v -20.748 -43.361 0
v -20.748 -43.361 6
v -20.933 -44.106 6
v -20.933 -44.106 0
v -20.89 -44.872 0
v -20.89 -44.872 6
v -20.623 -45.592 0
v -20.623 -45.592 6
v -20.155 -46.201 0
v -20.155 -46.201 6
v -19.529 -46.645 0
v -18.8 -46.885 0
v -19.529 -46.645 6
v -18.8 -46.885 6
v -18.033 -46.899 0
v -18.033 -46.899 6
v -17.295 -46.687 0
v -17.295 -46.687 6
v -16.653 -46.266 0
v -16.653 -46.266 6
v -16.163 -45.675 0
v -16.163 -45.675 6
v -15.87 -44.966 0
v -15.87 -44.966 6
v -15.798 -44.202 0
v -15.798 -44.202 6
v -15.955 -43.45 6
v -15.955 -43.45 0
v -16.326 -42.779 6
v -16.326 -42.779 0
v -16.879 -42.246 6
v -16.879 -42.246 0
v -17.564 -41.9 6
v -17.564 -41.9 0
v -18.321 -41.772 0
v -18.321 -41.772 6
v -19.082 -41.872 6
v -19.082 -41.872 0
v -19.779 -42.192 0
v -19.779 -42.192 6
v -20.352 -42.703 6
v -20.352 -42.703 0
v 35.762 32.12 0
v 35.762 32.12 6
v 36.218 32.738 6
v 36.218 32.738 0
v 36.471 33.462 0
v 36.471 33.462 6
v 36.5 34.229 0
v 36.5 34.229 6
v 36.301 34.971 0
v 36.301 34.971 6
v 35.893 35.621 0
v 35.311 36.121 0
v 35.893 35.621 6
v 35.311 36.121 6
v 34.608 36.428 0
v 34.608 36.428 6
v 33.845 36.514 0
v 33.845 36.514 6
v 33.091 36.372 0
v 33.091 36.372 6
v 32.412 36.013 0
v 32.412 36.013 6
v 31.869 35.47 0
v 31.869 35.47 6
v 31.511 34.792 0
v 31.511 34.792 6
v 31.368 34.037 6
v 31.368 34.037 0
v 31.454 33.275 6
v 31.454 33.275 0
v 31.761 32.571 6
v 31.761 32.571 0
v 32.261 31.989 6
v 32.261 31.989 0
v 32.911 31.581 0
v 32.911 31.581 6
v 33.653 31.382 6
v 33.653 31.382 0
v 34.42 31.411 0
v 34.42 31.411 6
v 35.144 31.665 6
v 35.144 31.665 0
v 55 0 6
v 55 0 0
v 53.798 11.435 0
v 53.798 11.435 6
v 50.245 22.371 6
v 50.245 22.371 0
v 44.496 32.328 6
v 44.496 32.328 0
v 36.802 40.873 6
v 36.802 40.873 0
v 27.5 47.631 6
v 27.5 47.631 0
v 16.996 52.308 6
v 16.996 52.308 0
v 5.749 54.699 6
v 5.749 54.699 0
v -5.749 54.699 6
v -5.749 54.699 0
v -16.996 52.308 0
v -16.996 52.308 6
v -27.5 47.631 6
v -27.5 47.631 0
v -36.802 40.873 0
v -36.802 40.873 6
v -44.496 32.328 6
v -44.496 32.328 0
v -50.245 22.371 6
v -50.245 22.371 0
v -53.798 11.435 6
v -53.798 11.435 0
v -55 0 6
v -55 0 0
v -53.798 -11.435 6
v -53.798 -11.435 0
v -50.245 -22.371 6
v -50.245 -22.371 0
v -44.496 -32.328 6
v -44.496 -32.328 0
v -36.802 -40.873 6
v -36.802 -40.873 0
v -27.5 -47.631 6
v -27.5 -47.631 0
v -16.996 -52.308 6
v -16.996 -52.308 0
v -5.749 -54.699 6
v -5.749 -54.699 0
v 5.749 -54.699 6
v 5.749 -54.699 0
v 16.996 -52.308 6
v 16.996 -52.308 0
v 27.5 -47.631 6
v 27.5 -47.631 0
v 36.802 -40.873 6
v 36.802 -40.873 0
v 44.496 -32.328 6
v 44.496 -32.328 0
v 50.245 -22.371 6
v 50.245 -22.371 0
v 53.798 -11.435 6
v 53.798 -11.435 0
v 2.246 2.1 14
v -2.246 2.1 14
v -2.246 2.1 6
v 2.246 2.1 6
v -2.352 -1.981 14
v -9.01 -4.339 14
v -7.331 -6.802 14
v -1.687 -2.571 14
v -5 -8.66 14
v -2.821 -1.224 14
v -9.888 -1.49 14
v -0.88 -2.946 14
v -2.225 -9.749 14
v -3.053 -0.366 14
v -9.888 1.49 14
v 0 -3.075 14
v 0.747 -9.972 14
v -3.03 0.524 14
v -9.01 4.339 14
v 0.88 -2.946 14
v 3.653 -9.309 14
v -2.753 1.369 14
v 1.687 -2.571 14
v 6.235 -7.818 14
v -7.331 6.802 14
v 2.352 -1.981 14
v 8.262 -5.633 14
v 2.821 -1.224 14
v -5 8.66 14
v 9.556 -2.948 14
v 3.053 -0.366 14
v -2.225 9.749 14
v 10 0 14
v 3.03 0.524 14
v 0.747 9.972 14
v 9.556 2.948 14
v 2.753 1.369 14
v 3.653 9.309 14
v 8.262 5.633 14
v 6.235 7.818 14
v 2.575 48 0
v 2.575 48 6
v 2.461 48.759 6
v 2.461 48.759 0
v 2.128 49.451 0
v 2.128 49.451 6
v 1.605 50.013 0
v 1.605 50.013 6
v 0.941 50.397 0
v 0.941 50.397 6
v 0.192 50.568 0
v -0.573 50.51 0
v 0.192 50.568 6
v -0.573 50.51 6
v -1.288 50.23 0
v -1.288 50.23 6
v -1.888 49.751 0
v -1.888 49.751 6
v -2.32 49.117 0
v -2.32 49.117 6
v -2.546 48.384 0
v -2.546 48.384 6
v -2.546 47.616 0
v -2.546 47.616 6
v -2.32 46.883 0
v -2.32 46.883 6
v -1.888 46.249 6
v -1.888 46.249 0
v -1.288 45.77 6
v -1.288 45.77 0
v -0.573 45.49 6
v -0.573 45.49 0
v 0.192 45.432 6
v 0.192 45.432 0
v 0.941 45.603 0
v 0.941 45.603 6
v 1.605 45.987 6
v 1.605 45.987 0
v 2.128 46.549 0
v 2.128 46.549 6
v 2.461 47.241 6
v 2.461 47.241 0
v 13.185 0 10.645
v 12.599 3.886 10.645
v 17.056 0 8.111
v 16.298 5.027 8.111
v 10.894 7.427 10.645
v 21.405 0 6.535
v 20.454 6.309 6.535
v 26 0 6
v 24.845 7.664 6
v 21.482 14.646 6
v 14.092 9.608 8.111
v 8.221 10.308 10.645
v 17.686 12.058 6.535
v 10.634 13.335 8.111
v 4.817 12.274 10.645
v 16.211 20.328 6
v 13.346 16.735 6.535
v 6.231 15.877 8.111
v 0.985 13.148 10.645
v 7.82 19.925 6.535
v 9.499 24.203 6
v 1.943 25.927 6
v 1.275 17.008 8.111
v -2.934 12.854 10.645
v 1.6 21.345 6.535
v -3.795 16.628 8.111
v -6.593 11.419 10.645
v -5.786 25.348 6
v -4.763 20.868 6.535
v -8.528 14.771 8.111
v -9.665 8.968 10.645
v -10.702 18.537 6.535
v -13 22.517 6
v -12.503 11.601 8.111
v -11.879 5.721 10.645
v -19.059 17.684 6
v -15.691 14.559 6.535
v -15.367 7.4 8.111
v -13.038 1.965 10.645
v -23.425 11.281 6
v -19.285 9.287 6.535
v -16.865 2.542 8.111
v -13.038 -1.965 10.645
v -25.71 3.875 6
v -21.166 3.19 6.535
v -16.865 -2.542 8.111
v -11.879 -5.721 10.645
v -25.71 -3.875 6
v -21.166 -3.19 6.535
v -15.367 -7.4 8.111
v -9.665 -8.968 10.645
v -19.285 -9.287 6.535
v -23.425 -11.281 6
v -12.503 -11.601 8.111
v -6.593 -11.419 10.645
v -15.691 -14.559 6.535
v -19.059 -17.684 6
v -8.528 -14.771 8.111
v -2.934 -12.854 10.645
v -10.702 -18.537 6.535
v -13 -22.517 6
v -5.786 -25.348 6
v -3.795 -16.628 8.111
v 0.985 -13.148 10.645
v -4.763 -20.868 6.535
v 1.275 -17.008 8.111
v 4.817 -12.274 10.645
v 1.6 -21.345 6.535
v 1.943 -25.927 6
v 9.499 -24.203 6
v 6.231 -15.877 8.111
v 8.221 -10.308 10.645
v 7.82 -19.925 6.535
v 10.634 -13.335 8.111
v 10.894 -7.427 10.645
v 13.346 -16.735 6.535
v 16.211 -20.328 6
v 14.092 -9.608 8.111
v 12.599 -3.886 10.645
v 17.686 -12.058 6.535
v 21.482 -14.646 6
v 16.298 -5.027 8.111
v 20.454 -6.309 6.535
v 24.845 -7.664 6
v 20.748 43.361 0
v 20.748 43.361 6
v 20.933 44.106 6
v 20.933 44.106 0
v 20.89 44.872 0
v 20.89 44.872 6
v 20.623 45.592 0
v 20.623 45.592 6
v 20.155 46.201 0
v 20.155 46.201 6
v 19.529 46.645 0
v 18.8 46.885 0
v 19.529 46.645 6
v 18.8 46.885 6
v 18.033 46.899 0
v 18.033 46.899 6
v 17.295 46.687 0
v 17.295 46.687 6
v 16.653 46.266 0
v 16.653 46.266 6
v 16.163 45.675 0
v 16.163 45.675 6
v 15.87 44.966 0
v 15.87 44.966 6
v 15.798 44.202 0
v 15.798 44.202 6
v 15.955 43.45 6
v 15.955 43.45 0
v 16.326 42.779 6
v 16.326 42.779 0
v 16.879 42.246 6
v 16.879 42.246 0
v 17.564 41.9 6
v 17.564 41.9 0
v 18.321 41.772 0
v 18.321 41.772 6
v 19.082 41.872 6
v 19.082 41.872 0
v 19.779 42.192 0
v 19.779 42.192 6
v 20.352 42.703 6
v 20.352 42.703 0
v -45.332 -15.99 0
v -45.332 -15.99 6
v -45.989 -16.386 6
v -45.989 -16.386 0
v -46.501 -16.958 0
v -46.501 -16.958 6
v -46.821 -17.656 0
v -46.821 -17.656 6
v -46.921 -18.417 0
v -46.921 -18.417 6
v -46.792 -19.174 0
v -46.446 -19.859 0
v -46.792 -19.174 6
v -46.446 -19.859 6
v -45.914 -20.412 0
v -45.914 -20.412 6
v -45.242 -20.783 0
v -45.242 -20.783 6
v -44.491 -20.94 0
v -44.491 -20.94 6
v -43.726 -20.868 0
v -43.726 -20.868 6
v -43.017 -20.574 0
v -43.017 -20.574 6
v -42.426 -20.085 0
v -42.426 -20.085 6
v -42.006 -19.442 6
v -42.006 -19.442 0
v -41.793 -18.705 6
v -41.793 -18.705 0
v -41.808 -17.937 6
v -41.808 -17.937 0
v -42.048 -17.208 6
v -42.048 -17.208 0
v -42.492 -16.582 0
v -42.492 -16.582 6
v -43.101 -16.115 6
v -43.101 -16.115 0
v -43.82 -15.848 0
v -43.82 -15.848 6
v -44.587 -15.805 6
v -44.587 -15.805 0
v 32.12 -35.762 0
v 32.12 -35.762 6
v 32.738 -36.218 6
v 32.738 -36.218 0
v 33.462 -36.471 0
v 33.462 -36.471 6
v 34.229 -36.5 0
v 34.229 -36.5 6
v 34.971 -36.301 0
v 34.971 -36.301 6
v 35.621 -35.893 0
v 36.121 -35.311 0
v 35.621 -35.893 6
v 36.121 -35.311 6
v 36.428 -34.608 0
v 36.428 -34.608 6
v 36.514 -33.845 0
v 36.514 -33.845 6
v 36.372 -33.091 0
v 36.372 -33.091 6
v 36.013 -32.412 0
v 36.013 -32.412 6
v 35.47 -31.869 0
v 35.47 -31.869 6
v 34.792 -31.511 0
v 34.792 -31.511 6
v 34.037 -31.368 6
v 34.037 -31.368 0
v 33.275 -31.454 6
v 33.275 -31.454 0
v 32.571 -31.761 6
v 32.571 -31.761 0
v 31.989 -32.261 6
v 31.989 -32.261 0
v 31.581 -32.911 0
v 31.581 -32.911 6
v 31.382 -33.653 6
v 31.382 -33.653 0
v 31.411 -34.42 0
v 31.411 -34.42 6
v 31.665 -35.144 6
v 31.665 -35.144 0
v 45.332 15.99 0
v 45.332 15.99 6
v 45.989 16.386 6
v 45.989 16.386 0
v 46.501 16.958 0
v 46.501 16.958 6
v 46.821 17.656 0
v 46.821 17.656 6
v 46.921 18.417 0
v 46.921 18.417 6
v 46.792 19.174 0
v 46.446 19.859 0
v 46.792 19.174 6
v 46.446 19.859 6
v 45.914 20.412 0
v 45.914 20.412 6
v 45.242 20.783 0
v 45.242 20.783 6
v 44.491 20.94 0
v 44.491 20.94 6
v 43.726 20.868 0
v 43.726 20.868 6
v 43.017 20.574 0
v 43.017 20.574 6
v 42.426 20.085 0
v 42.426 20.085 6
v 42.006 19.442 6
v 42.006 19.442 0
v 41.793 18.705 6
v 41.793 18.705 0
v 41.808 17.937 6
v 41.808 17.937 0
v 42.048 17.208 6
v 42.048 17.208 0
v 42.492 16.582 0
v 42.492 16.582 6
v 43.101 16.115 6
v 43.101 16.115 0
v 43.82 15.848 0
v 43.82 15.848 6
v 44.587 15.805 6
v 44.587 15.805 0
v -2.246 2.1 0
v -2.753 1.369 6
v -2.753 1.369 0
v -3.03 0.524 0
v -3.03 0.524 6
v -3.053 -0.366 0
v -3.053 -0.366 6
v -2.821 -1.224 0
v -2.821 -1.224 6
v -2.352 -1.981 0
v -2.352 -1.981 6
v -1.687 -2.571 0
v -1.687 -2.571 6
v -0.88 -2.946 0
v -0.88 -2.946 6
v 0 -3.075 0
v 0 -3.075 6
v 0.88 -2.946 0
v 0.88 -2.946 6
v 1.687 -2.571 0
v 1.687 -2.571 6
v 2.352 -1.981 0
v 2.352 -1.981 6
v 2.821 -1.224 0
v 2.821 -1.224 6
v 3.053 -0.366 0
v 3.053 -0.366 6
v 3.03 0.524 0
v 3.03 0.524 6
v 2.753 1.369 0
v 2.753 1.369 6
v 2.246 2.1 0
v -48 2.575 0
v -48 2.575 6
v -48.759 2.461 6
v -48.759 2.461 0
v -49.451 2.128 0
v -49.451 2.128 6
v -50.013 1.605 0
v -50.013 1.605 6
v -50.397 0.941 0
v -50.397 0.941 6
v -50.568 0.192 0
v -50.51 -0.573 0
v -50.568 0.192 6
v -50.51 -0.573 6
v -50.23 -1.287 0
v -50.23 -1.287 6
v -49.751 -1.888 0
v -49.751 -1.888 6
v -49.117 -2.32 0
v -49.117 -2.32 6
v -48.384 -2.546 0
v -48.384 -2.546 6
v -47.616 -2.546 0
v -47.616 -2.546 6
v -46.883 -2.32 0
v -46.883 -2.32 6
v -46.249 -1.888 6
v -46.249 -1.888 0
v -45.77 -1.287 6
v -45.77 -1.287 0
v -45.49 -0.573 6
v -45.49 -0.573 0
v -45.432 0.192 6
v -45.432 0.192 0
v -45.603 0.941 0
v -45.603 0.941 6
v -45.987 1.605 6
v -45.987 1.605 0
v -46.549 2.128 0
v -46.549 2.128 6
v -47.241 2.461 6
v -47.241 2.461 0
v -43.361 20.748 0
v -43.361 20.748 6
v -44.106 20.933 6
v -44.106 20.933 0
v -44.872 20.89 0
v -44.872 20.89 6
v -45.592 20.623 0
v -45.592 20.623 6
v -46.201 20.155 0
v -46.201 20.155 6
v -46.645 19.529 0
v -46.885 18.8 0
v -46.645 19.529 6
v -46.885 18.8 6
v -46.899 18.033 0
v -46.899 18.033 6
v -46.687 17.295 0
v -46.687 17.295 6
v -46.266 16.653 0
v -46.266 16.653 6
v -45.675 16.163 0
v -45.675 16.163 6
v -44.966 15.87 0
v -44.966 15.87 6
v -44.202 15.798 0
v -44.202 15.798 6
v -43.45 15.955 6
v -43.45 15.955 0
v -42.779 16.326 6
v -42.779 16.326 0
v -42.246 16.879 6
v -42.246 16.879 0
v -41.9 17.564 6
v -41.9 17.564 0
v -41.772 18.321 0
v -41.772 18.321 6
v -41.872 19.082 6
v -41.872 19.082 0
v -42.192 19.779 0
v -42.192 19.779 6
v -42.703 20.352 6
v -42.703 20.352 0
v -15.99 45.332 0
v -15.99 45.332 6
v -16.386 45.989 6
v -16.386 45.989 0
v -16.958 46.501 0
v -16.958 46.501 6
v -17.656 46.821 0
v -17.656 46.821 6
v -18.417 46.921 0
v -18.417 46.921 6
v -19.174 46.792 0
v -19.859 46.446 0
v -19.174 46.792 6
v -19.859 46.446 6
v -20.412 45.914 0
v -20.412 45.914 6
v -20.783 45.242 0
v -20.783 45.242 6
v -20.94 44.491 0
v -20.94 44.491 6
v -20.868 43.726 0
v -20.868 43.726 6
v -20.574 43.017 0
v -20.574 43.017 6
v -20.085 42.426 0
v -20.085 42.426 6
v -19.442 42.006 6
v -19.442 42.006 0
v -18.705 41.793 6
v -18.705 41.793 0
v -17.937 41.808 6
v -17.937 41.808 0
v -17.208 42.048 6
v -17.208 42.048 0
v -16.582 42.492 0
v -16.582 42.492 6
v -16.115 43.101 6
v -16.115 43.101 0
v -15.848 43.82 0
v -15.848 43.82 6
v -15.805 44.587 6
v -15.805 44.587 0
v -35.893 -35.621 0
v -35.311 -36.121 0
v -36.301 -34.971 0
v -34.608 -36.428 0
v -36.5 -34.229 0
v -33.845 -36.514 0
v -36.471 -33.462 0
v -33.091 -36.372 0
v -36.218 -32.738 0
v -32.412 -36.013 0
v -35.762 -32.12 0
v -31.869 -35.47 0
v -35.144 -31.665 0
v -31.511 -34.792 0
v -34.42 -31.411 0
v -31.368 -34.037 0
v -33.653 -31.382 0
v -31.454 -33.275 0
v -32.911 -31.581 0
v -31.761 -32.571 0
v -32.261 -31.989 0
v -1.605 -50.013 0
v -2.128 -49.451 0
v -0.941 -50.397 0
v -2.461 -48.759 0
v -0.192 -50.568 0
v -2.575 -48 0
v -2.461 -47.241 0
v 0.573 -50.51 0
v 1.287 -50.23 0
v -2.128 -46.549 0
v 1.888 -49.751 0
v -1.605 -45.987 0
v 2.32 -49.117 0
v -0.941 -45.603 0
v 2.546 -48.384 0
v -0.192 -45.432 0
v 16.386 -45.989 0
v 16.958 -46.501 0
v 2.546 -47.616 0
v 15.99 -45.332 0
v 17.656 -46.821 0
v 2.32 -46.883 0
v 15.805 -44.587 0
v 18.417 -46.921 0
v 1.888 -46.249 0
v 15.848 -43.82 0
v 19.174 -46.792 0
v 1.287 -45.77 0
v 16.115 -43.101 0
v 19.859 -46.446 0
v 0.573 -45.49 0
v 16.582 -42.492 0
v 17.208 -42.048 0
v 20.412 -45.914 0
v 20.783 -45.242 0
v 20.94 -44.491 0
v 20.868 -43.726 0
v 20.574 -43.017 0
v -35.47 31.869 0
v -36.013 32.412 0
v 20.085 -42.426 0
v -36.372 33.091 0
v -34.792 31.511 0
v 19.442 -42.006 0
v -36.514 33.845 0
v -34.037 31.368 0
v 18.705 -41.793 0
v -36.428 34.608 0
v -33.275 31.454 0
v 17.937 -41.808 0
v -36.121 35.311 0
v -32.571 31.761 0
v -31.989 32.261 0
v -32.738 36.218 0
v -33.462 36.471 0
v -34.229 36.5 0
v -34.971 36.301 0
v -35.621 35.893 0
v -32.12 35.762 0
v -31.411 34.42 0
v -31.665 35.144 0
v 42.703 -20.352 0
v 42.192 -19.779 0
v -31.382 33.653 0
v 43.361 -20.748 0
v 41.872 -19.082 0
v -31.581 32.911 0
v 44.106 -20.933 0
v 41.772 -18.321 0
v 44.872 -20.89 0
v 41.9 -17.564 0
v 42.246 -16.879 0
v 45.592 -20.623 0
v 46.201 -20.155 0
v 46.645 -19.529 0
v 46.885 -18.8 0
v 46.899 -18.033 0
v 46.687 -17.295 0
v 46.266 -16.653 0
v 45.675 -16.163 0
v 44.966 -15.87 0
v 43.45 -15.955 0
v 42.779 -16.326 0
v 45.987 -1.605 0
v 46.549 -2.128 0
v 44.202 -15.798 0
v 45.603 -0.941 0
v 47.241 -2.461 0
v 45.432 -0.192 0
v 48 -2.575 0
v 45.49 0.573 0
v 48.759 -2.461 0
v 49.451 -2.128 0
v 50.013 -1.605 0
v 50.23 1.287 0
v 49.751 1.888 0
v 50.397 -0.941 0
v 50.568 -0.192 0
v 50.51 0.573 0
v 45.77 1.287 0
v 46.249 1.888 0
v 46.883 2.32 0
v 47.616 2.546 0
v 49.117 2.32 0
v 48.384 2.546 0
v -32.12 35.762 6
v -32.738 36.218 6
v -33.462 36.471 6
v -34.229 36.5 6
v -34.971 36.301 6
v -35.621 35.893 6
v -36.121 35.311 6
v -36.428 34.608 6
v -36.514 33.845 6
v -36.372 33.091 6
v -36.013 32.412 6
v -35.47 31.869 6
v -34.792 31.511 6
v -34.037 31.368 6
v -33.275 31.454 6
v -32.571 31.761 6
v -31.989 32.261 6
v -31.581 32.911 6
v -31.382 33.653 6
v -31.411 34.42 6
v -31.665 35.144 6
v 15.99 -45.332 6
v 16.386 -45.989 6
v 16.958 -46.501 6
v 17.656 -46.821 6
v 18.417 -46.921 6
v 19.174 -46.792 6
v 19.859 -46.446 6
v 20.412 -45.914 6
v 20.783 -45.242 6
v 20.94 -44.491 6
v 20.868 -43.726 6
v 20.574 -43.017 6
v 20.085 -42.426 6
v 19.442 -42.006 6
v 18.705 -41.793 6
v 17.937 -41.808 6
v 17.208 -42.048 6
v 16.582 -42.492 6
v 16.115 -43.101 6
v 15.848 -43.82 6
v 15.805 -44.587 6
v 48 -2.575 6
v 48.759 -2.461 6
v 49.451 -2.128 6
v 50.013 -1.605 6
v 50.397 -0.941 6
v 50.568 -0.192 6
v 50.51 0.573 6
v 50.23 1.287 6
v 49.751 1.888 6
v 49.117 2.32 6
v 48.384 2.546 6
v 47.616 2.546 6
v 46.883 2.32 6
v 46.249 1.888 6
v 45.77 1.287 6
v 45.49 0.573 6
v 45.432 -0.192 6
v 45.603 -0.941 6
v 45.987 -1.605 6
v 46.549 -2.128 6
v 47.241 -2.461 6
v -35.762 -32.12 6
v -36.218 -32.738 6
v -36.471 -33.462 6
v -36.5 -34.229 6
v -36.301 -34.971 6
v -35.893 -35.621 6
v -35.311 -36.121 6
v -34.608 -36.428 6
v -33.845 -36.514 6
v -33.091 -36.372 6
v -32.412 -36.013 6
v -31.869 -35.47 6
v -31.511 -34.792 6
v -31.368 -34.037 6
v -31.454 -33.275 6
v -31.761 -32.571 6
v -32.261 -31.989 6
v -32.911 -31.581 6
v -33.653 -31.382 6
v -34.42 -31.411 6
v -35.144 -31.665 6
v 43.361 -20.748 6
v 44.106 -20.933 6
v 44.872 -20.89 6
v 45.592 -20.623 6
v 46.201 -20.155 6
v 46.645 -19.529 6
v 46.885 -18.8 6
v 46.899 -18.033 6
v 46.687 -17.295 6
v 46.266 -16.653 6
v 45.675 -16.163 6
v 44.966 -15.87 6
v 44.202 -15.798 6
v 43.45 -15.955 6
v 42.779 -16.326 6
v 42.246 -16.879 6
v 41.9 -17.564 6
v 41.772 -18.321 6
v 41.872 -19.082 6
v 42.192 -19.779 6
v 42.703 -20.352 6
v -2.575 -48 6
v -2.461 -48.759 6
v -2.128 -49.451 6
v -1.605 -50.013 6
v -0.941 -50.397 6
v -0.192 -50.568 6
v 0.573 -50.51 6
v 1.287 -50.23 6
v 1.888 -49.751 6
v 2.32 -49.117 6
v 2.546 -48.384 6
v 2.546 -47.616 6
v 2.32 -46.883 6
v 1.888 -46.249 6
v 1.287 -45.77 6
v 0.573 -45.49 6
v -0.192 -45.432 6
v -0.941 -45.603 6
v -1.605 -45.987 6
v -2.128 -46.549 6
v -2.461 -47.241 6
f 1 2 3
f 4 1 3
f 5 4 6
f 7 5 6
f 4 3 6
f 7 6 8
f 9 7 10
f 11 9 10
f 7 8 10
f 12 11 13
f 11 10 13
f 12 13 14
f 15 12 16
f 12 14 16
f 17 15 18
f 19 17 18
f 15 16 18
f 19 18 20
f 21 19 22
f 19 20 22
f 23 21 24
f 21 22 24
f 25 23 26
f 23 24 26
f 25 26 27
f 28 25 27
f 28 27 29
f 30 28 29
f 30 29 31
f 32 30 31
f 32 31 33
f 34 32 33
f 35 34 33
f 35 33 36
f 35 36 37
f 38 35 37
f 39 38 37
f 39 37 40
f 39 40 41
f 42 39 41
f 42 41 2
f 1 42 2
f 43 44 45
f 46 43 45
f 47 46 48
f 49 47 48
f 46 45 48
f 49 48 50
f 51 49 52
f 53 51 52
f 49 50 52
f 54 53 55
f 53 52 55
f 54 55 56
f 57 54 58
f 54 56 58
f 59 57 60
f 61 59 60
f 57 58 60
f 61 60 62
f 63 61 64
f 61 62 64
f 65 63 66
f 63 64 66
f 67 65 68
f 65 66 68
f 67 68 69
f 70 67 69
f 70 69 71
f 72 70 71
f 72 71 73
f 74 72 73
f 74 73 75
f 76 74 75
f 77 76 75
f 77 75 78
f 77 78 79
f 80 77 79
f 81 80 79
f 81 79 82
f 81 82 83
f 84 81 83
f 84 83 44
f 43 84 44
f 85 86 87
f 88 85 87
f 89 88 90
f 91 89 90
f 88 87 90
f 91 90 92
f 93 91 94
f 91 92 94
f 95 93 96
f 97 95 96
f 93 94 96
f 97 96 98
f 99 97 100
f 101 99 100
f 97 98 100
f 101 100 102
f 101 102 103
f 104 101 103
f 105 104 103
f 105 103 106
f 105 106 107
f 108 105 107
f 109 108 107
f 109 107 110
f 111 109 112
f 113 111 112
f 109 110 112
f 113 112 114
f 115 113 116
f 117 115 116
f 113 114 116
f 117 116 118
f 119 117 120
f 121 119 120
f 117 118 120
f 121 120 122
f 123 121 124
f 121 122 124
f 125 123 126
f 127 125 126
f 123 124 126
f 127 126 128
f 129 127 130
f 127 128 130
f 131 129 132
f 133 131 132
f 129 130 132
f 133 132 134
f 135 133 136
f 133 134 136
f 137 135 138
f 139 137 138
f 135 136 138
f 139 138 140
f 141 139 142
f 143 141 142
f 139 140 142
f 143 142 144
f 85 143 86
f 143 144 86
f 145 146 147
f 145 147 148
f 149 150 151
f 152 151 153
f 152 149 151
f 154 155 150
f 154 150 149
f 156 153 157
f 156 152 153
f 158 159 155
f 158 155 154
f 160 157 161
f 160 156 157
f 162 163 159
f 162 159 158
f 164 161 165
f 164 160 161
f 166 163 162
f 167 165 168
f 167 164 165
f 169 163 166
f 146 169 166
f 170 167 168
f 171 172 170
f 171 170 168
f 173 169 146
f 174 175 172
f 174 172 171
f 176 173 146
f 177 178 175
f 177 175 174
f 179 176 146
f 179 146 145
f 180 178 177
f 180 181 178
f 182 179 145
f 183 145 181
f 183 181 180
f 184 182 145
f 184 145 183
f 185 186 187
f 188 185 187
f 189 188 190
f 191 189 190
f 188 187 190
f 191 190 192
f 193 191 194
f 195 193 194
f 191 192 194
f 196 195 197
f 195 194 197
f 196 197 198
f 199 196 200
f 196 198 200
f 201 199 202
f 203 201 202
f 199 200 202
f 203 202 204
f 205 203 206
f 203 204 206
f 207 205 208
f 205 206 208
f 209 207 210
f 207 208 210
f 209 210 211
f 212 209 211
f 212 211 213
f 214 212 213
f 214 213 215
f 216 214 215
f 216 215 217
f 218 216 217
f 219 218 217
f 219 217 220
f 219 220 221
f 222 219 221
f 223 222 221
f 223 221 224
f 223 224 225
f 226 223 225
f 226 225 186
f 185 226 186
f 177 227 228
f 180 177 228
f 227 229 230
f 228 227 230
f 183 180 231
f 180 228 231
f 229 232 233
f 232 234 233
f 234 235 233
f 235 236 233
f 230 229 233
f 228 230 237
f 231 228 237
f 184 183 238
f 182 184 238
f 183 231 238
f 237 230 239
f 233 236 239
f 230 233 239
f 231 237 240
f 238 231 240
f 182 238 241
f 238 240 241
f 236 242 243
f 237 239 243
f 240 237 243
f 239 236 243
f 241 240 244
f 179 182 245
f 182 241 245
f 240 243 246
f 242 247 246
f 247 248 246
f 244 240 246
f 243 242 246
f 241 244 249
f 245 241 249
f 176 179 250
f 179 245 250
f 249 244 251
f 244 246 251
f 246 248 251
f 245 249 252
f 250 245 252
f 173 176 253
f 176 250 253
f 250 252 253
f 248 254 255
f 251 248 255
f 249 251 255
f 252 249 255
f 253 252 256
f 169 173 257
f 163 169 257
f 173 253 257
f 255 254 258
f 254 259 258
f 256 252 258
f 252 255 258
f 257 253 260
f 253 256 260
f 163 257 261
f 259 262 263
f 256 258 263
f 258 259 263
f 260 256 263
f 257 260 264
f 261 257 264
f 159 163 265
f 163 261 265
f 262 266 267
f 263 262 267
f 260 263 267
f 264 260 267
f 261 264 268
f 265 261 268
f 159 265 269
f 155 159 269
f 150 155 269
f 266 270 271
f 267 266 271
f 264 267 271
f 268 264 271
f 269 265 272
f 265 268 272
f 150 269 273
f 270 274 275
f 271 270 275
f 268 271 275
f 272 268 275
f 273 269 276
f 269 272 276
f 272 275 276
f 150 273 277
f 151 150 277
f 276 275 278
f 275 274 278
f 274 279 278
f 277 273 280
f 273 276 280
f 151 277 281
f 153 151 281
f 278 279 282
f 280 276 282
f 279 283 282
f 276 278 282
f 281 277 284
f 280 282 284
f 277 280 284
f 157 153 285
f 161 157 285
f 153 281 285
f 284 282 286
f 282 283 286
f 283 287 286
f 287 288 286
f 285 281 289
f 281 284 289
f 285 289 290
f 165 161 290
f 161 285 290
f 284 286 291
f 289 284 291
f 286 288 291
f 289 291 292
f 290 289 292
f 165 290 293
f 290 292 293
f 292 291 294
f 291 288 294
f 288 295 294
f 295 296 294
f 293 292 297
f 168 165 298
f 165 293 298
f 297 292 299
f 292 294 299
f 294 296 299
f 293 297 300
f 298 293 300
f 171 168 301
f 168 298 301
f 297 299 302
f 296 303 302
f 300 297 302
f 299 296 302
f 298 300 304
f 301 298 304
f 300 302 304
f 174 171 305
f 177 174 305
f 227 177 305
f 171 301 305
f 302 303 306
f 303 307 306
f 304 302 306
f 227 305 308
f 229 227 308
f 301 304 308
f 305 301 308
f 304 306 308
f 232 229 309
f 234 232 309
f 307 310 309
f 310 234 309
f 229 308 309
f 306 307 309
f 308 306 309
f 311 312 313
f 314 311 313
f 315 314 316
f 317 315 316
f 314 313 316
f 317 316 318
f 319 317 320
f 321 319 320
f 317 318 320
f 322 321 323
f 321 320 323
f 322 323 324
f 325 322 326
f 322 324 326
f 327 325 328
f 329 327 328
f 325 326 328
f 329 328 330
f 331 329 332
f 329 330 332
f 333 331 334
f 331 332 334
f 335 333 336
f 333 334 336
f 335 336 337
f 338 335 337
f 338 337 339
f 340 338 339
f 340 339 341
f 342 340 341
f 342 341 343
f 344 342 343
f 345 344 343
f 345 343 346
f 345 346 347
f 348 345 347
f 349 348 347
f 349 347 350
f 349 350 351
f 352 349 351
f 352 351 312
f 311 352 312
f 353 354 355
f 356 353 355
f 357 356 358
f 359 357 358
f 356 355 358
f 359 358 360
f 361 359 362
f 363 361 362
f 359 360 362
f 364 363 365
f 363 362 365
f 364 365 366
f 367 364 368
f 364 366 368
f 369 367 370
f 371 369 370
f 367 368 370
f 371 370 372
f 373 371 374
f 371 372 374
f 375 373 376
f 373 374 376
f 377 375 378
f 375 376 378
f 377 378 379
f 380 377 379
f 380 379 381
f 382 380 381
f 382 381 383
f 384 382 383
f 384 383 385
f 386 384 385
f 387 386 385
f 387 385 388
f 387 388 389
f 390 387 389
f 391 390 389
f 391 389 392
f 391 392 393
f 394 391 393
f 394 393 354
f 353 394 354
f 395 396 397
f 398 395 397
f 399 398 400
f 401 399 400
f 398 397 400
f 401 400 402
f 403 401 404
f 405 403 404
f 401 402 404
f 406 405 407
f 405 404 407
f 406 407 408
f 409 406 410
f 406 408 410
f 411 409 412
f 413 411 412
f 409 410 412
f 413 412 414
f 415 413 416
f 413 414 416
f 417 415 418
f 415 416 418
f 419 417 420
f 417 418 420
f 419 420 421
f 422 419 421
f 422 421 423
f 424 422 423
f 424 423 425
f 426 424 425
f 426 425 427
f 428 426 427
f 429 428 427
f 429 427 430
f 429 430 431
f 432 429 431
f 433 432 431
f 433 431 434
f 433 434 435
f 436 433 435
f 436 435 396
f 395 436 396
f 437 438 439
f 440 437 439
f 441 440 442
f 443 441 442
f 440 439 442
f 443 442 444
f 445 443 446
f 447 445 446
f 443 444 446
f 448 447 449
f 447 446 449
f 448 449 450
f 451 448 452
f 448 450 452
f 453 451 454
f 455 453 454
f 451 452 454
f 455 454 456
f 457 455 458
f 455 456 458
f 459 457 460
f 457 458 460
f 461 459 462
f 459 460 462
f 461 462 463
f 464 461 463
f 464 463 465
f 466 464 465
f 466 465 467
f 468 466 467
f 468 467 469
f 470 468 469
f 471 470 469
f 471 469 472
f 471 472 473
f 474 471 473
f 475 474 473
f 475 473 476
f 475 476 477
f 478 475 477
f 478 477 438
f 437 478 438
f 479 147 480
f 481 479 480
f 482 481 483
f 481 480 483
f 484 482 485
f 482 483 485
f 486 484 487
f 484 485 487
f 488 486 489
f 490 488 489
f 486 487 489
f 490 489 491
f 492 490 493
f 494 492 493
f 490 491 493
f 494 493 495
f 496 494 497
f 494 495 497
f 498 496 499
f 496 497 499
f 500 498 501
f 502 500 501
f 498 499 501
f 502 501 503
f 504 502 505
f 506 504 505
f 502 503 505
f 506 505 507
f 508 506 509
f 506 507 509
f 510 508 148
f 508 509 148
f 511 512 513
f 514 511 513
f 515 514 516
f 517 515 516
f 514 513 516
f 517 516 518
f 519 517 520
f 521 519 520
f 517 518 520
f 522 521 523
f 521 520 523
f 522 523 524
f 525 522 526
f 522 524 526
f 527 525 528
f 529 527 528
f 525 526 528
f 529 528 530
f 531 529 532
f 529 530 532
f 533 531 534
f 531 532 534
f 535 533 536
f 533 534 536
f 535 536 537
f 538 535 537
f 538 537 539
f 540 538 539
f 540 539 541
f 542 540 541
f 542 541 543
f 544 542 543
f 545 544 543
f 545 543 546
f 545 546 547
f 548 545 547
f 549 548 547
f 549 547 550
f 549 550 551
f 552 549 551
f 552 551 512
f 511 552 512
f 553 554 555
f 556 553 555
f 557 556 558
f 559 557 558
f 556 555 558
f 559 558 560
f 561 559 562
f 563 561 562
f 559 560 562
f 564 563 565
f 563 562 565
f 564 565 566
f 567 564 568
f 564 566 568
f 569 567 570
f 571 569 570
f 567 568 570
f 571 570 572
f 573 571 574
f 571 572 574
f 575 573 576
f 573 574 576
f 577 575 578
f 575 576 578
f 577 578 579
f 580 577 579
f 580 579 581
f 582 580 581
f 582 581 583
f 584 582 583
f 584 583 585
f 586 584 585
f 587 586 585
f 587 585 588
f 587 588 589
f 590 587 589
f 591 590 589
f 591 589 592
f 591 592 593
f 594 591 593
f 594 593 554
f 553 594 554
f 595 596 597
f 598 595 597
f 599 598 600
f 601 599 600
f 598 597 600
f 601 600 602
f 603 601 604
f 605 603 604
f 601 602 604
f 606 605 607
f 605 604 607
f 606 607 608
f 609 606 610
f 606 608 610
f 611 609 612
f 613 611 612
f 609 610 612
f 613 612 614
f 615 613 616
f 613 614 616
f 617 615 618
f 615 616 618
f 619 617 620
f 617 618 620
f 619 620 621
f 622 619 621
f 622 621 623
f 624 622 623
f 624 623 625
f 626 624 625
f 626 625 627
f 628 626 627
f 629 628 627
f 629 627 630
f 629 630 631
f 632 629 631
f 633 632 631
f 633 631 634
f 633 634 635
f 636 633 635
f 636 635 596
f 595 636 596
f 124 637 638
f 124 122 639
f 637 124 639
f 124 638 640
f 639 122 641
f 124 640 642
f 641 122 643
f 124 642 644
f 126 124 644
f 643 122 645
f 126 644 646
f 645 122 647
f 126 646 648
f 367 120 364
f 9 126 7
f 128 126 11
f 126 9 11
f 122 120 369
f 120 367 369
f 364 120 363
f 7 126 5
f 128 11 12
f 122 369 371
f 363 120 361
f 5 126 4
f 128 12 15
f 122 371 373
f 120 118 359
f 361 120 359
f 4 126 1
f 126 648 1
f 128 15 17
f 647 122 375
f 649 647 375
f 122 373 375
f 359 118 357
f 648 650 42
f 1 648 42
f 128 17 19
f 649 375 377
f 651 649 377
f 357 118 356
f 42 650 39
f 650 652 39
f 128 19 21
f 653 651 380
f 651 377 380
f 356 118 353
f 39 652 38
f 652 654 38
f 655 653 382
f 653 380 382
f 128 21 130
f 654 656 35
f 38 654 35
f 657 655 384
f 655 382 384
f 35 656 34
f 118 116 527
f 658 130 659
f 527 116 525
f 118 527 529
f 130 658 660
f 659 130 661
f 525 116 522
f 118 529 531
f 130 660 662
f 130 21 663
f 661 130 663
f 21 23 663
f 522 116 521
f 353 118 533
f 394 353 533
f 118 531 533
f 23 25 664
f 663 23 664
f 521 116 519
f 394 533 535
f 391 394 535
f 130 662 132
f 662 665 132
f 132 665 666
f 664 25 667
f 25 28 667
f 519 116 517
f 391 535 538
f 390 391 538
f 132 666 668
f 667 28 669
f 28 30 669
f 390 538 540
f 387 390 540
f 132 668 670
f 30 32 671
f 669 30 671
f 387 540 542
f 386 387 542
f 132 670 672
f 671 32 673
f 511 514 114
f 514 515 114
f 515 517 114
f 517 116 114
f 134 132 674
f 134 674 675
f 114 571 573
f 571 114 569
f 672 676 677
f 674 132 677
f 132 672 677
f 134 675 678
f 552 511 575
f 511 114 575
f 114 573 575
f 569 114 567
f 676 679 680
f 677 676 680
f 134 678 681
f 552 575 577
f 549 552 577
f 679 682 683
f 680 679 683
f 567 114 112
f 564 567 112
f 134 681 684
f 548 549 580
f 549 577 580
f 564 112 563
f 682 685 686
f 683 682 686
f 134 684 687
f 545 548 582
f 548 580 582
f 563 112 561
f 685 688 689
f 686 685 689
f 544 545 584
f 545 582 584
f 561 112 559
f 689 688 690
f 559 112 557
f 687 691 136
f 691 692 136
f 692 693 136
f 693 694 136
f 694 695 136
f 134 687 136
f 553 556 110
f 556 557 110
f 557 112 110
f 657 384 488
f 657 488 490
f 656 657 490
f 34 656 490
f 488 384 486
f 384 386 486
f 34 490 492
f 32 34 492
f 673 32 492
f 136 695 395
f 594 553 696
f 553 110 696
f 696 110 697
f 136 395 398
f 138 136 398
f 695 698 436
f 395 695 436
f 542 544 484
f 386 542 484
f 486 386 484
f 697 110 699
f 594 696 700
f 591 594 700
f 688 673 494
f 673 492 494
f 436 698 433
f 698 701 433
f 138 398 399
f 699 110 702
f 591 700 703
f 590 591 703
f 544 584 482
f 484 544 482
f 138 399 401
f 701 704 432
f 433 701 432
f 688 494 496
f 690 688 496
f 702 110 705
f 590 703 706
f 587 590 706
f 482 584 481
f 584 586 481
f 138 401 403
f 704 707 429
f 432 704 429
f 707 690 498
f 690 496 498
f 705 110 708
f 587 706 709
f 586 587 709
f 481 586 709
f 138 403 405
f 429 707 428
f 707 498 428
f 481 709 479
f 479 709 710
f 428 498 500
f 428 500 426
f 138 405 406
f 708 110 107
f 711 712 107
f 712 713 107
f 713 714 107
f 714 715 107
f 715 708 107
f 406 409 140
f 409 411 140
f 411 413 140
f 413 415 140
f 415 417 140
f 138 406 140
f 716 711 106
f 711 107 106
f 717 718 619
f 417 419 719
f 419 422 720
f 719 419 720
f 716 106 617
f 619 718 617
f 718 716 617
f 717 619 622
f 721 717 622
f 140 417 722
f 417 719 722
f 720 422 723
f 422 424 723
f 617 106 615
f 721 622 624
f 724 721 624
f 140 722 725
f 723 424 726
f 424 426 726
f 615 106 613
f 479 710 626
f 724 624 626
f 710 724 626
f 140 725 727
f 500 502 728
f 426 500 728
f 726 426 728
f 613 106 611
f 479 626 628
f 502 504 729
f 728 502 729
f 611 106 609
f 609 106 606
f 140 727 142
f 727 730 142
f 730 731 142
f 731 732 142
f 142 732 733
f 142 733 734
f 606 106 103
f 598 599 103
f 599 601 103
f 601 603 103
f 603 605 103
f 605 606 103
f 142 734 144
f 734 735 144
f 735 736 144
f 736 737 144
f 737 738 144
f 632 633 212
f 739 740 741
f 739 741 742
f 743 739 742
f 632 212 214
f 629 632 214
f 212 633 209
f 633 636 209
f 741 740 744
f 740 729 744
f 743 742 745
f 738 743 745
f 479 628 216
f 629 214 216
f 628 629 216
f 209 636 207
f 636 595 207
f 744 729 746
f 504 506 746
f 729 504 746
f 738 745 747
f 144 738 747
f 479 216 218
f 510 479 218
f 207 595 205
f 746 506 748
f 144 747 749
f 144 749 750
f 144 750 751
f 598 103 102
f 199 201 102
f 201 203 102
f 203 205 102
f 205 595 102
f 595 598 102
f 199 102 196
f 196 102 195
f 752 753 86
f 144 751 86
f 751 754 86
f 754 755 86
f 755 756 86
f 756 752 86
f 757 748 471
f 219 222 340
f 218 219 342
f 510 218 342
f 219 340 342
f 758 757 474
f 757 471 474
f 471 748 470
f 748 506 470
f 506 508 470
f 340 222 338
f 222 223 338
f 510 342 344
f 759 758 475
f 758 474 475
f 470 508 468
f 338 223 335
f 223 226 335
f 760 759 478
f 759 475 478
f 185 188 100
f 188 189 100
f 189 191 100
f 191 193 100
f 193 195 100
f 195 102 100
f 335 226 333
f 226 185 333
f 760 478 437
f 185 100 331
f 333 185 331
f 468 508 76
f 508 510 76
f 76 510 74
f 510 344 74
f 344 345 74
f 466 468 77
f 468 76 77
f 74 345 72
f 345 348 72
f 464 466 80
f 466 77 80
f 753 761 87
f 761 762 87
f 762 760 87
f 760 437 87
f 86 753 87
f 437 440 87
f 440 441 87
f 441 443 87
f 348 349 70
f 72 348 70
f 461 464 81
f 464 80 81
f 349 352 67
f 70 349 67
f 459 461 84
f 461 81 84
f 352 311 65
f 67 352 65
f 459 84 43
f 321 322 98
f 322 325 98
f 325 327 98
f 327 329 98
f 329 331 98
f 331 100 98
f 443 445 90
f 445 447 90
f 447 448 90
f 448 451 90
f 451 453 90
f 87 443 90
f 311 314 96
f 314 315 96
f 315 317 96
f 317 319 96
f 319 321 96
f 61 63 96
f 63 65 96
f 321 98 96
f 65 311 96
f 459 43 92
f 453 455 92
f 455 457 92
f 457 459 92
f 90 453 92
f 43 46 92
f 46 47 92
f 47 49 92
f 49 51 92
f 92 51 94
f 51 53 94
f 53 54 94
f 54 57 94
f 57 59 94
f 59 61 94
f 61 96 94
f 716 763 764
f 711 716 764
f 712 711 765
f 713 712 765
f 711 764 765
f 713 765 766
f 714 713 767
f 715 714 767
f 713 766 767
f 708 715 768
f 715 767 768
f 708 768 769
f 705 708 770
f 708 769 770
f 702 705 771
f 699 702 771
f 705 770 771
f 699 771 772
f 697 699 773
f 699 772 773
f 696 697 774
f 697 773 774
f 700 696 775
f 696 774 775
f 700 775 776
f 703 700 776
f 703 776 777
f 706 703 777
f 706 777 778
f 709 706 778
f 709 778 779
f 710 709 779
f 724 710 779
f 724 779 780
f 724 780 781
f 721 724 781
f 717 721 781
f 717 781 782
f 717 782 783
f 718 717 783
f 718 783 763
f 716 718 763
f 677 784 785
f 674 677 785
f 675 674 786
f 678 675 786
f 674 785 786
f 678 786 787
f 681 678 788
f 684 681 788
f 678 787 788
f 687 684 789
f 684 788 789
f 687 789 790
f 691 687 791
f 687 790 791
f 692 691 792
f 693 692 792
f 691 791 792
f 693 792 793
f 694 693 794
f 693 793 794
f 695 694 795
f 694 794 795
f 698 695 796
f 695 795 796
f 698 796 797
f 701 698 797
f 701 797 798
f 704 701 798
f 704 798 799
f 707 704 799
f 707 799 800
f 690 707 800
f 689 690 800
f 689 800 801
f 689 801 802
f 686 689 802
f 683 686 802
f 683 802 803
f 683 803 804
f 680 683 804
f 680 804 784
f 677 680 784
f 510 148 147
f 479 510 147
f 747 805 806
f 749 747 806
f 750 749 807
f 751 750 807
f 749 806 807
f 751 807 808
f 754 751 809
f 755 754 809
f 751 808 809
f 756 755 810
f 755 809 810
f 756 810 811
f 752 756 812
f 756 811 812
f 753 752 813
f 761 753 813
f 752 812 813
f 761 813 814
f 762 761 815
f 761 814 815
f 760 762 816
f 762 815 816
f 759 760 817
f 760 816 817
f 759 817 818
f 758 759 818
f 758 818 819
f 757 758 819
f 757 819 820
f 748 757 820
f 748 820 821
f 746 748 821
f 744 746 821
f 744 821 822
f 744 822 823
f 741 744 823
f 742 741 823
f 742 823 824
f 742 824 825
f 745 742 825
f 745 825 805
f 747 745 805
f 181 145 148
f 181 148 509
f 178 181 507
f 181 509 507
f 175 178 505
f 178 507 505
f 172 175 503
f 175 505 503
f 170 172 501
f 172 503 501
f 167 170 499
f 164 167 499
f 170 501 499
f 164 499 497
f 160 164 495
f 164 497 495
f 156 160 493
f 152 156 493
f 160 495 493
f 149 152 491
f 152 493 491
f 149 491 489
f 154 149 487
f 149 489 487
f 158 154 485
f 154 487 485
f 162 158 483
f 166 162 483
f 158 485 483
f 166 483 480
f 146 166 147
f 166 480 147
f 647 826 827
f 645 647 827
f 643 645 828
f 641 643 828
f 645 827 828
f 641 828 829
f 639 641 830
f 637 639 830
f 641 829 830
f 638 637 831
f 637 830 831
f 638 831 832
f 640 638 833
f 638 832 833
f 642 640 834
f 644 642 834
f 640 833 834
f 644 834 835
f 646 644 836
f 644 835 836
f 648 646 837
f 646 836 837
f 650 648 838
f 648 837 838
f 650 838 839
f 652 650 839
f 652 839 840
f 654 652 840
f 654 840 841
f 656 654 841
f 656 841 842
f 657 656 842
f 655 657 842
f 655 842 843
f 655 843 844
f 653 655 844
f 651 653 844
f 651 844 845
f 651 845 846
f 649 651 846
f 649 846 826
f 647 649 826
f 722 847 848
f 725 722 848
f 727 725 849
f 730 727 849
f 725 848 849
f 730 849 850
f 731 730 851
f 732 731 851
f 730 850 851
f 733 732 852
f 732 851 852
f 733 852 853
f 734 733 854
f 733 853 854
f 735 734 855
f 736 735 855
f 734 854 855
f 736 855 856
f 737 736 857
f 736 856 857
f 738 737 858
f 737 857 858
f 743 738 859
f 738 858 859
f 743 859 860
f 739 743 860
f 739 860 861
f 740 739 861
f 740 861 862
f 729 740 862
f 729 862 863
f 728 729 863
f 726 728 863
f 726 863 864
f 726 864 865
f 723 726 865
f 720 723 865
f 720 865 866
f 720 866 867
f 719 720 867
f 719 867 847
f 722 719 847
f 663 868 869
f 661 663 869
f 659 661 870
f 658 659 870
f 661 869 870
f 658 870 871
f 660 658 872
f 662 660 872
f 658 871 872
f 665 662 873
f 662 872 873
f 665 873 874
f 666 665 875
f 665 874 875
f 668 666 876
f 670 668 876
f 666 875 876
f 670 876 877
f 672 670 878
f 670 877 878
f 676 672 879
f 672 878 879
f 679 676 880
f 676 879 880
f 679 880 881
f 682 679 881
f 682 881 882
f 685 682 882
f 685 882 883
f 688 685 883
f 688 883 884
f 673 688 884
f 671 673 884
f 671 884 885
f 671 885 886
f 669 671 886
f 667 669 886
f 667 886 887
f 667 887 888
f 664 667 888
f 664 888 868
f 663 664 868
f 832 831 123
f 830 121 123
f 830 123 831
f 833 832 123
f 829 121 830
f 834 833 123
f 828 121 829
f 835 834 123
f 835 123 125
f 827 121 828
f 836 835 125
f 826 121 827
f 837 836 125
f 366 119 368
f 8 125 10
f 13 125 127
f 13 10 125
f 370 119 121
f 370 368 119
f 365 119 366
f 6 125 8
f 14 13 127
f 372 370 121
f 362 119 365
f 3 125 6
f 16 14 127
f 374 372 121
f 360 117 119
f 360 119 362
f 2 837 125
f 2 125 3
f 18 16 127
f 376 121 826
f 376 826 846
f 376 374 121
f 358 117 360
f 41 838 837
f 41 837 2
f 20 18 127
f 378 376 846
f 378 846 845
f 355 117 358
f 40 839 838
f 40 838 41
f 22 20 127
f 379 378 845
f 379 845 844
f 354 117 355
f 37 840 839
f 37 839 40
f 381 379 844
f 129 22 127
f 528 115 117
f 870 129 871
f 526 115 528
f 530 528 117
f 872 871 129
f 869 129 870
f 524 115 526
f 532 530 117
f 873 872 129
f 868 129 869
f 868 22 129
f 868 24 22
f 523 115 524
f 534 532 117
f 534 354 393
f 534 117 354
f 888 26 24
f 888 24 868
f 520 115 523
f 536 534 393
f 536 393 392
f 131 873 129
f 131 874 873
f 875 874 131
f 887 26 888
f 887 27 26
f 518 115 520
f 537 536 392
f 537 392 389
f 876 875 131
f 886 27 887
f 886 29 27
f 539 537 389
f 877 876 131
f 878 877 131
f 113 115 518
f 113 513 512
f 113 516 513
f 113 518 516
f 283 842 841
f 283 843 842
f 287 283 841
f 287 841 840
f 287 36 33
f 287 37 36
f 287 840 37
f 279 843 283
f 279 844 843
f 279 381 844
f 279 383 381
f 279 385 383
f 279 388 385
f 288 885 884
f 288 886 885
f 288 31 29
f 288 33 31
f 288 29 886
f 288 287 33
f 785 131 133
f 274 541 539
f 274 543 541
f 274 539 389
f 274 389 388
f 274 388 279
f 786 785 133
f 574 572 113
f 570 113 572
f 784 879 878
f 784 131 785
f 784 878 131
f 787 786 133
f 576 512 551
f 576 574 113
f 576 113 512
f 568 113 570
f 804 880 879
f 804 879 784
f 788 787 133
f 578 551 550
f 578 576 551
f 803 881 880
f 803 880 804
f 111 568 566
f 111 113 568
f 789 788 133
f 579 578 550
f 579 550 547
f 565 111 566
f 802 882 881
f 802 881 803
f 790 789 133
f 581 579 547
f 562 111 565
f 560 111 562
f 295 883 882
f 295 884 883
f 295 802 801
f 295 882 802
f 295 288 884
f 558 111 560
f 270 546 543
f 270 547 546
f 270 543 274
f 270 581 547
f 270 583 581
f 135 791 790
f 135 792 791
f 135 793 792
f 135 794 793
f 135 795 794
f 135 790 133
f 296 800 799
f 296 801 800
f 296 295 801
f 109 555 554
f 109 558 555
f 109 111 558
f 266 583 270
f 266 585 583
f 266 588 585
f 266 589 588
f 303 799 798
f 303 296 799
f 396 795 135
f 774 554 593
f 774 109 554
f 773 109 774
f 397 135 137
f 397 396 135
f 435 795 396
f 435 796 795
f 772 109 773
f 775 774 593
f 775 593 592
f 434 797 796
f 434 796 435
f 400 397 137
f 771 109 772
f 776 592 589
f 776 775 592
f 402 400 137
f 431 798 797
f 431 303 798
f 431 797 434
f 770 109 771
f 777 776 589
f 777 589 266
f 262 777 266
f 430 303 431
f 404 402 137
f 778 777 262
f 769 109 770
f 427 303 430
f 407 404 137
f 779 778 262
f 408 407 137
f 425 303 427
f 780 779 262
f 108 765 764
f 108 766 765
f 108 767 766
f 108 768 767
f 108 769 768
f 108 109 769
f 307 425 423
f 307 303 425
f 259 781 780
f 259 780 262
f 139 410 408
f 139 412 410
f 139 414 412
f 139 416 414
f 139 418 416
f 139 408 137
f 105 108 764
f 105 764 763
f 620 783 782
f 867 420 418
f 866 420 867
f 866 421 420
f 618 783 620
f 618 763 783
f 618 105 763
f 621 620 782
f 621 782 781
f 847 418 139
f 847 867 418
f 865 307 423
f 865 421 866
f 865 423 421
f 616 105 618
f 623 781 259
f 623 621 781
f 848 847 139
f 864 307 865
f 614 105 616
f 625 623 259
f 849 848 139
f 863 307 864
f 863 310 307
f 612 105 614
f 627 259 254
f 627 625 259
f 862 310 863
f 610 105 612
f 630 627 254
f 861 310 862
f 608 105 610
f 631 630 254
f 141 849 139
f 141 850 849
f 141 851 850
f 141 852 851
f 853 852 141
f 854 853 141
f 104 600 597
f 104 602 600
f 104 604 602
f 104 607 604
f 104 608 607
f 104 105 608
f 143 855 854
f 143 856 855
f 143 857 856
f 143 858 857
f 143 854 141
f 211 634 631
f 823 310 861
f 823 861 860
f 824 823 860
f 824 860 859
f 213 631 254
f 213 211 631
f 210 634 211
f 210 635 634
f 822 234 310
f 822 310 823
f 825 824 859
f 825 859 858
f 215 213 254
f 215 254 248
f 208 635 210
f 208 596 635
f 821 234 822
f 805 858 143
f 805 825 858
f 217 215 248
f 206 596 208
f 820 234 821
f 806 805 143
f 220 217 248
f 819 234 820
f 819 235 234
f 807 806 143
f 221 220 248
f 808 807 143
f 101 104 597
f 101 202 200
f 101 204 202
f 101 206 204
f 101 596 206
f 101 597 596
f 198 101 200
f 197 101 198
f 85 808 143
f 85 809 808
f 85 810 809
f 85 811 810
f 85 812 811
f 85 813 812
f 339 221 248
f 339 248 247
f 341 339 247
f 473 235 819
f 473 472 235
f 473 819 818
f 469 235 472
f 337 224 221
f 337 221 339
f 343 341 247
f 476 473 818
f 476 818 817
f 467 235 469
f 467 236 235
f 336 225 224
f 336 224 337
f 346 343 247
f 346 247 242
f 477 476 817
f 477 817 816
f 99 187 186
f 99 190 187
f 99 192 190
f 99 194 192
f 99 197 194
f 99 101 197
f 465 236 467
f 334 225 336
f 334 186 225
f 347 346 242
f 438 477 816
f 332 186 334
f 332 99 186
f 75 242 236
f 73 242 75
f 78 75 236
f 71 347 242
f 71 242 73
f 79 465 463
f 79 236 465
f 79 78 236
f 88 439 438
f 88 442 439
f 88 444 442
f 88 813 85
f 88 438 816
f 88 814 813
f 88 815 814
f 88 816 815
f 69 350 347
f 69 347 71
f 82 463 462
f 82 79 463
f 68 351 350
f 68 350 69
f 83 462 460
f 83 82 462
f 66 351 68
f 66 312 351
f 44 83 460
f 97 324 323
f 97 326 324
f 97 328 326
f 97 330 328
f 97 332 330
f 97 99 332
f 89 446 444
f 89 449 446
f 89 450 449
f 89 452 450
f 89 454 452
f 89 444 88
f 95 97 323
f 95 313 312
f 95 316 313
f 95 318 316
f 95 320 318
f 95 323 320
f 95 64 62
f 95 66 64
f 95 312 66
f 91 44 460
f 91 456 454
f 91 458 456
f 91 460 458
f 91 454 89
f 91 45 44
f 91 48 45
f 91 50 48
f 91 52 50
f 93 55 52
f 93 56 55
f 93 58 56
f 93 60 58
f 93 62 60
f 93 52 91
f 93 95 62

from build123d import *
from build123d.topology import SkipClean

# Parameters (mm, degrees)
ESBO_O1_R                = 55
RESSALTO_EXTRUS_O1_DEPTH = 6
ESBO_O2_R                = 10
RESSALTO_EXTRUS_O2_DEPTH = 8
FILETE3_R                = 20
ESBO_O3_R                = 2.575
CORTE_EXTRUS_O1_DEPTH    = 79.192071209
PADR_OCIRCULAR1_COUNT    = 16
CORTE_EXTRUS_O2_DEPTH    = 79.192071209


with BuildPart() as part:
    # Esboço1 → Ressalto-extrusão1 (new body)
    with BuildSketch(Plane.XY):
        Circle(ESBO_O1_R)
    extrude(amount=RESSALTO_EXTRUS_O1_DEPTH)

    # Esboço2 → Ressalto-extrusão2 (add)
    with BuildSketch(Plane.XY.offset(6)):
        Circle(ESBO_O2_R)
        with BuildLine():
            Line((-2.24624687, 2.1), (2.24624687, 2.1))
            ThreePointArc((2.24624687, 2.1), (0, -3.075), (-2.24624687, 2.1))
        make_face(mode=Mode.SUBTRACT)
    extrude(amount=RESSALTO_EXTRUS_O2_DEPTH)

    # Filete3
    # the kernel refuses this fillet: 20 mm, written as the material it adds along each edge
    with BuildSketch(Plane(origin=(0, 0, 6), x_dir=(1, 0, 0), z_dir=(0, -1, 0))) as filete3_piece_1:
        with BuildLine():
            CenterArc((26, 20), FILETE3_R, 216.869897646, 53.130102354)
            Line((10, 8), (9.68, 7.76))
            ThreePointArc((9.68, 7.76), (9.6, 4), (9.6, 0))
            Line((9.6, 0), (10, -0.4))
            Line((10, -0.4), (26, -0.4))
            Line((26, -0.4), (26, 0))
        make_face()
    revolve(axis=Axis((0, 0, 6), (0, 0, 1)))

    # Esboço3 → Corte-extrusão1 (cut, through all)
    with BuildSketch(Plane.XY.offset(6)):
        with Locations((0, 48)):
            Circle(ESBO_O3_R)
    corte_extrus_o1 = extrude(amount=-CORTE_EXTRUS_O1_DEPTH, mode=Mode.SUBTRACT)

    # PadrãoCircular1: Corte-extrusão1 ×16 about axis
    padr_ocircular1_axis = Axis((0, 0, 0), (0, 0, 1))
    for i in range(1, PADR_OCIRCULAR1_COUNT):
        add(corte_extrus_o1.rotate(padr_ocircular1_axis, i * 360 / PADR_OCIRCULAR1_COUNT), mode=Mode.SUBTRACT)

    # Esboço4 → Corte-extrusão2 (cut, through all)
    with SkipClean():  # the faces are left unmerged after this step: merging them gives an invalid solid
        with BuildSketch(Plane.XY.offset(6)):
            with BuildLine():
                Line((2.24624687, 2.1), (-2.24624687, 2.1))
                ThreePointArc((-2.24624687, 2.1), (0, -3.075), (2.24624687, 2.1))
            make_face()
        extrude(amount=-CORTE_EXTRUS_O2_DEPTH, mode=Mode.SUBTRACT)
    add(part.part.scale(1), mode=Mode.REPLACE)  # the faces are merged on a copy


solid = part.part
